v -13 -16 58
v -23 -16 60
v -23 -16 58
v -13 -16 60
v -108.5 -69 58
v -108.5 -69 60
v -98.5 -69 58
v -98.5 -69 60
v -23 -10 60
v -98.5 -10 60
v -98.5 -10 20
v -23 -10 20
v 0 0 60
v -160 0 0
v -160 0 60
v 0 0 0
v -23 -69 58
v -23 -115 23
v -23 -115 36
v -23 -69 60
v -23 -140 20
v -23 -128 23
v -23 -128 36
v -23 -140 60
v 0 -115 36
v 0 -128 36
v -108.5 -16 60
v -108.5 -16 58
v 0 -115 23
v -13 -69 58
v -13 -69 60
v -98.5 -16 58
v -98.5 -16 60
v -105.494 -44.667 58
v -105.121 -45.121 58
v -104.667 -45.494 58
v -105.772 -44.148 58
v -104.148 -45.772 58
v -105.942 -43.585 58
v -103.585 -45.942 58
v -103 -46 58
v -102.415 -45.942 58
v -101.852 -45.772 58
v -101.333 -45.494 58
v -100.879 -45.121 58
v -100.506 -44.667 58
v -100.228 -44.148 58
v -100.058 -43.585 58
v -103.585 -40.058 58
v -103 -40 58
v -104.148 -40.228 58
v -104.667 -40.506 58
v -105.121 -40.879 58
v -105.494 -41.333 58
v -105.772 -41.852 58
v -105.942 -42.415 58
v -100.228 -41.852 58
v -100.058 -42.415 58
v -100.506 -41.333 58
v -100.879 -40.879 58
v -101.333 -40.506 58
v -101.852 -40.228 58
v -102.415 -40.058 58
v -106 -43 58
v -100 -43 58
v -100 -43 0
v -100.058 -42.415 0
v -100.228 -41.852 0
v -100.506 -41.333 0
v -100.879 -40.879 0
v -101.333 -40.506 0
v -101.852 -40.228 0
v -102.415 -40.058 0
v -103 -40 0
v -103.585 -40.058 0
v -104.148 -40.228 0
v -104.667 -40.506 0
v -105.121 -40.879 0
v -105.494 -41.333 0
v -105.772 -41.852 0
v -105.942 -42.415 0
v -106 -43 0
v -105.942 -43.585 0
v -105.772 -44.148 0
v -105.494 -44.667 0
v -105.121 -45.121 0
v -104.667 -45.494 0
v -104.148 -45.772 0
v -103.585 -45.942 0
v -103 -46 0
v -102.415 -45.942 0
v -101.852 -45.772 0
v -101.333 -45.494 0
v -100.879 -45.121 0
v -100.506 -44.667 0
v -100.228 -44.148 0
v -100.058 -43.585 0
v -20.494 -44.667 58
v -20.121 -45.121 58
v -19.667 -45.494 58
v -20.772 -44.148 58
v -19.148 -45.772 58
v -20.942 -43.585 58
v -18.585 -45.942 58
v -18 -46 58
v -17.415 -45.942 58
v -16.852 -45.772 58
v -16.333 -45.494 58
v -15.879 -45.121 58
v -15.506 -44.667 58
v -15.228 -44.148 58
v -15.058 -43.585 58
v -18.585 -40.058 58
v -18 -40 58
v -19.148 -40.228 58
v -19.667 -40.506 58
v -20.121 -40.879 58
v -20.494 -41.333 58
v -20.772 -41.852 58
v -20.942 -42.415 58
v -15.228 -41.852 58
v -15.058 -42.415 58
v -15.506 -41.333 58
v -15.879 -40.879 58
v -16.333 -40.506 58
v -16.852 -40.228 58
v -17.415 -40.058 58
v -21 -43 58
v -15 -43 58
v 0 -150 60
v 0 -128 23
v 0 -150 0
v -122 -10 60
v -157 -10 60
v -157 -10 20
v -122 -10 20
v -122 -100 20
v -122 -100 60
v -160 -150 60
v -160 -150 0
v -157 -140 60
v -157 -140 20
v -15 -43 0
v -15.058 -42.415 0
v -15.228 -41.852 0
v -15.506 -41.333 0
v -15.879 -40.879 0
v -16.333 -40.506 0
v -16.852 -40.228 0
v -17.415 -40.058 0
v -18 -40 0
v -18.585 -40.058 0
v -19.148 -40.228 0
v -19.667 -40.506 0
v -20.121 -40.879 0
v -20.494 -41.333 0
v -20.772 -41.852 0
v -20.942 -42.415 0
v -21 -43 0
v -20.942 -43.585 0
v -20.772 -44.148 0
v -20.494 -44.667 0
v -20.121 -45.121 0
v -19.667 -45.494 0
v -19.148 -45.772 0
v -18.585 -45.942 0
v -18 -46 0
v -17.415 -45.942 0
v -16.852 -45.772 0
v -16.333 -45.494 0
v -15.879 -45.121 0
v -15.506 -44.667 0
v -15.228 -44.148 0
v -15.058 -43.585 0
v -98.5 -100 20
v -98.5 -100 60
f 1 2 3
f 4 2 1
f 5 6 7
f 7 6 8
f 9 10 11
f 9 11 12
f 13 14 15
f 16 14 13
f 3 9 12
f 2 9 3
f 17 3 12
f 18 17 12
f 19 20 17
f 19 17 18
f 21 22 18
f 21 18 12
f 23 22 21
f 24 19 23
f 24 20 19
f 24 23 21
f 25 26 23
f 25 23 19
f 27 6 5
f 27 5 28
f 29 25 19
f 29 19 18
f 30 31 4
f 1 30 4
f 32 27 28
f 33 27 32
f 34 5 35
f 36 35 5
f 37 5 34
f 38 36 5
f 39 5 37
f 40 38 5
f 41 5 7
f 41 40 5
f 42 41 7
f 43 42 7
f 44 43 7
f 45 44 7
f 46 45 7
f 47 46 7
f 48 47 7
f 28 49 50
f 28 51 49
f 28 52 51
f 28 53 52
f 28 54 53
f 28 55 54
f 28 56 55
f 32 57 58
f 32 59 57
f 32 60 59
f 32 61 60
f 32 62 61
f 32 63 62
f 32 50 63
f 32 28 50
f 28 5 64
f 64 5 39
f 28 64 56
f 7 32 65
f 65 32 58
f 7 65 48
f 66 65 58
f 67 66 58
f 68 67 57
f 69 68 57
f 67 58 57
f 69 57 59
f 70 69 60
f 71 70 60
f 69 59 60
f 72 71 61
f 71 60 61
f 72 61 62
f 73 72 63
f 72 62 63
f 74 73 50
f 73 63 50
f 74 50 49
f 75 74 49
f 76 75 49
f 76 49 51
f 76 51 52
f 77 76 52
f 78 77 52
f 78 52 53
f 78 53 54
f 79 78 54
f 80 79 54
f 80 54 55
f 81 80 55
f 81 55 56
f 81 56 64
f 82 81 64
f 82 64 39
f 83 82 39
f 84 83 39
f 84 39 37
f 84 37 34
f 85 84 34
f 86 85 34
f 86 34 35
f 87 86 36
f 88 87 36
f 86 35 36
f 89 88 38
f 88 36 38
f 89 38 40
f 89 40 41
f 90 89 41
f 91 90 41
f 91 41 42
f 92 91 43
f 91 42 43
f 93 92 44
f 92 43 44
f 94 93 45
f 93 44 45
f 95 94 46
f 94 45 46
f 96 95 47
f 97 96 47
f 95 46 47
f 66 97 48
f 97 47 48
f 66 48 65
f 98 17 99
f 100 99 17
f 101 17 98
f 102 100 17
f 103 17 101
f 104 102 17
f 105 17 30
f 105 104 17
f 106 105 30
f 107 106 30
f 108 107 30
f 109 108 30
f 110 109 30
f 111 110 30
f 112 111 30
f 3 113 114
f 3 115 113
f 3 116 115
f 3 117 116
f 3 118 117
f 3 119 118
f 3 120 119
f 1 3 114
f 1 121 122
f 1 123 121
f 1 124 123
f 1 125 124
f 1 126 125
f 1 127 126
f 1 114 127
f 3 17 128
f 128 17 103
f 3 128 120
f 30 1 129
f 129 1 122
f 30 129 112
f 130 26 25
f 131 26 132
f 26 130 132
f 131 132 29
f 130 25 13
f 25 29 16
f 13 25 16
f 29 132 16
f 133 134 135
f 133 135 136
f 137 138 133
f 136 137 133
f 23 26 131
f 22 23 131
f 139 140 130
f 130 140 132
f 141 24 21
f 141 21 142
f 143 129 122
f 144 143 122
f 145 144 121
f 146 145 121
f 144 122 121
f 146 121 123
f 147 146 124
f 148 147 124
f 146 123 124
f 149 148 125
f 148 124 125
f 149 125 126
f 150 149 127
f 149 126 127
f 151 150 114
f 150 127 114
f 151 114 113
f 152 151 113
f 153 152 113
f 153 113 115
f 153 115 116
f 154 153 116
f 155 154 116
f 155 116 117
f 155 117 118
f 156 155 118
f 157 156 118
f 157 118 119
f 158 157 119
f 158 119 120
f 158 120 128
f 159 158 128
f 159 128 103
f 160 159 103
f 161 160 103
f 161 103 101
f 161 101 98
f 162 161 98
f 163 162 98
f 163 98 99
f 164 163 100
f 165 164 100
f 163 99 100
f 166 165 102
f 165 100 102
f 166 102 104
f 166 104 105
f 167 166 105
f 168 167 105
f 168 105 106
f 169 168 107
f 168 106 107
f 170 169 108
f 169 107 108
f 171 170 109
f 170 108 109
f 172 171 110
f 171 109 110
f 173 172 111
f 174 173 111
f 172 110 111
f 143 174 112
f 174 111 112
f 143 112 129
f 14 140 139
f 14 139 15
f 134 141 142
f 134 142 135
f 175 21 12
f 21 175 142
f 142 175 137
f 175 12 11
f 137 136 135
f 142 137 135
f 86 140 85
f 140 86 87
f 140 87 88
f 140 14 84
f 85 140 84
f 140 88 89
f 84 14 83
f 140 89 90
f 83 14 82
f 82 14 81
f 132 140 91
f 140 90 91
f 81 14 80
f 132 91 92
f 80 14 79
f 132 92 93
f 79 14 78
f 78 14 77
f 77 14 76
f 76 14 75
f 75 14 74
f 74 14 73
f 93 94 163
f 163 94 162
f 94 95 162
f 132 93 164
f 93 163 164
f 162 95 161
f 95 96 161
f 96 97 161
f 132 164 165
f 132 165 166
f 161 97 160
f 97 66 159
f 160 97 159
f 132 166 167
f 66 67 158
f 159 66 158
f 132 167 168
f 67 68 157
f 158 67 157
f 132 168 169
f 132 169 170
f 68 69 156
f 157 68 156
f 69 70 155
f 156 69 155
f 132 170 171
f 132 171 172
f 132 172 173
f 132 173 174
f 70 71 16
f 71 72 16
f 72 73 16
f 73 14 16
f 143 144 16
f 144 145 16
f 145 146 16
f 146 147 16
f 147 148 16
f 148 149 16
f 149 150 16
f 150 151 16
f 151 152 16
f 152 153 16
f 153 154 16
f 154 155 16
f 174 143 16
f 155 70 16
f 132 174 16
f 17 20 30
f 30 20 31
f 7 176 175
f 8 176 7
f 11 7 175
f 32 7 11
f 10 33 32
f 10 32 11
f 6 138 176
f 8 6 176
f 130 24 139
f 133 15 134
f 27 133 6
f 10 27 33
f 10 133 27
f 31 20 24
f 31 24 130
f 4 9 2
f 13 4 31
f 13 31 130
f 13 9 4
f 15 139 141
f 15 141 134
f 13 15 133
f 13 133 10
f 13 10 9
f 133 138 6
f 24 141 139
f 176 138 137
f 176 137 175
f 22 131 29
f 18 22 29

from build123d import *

# Parameters (mm, degrees)
SKETCH2_W           = 160
SKETCH2_H           = 150
BOSS_EXTRUDE1_DEPTH = 60
CUT_EXTRUDE1_DEPTH  = 40
SKETCH4_R           = 3
CUT_EXTRUDE2_DEPTH  = 60
SKETCH5_W           = 13
SKETCH5_H           = 13
CUT_EXTRUDE3_DEPTH  = 50
SKETCH6_W           = 10
SKETCH6_H           = 53
CUT_EXTRUDE4_DEPTH  = 2
SKETCH7_W           = 35
SKETCH7_H           = 130
CUT_EXTRUDE5_DEPTH  = 40


with BuildPart() as part:
    # Sketch2 → Boss-Extrude1 (new body)
    with BuildSketch(Plane.XY):
        with Locations((-80, -75)):
            Rectangle(SKETCH2_W, SKETCH2_H)
    extrude(amount=BOSS_EXTRUDE1_DEPTH)

    # Sketch3 → Cut-Extrude1 (cut)
    with BuildSketch(Plane.XY.offset(60)):
        Polygon((-98.5, -10), (-23, -10), (-23, -140), (-157, -140), (-157, -100), (-98.5, -100), align=None)
    extrude(amount=-CUT_EXTRUDE1_DEPTH, mode=Mode.SUBTRACT)

    # Sketch4 → Cut-Extrude2 (cut)
    with BuildSketch(Plane.XY.offset(60)):
        with Locations((-103, -43)):
            Circle(SKETCH4_R)
        with Locations((-18, -43)):
            Circle(SKETCH4_R)
    extrude(amount=-CUT_EXTRUDE2_DEPTH, mode=Mode.SUBTRACT)

    # Sketch5 → Cut-Extrude3 (cut)
    with BuildSketch(Plane(origin=(0, 0, 0), x_dir=(0, 0, -1), z_dir=(1, 0, 0))):
        with Locations((-29.5, -121.5)):
            Rectangle(SKETCH5_W, SKETCH5_H)
    extrude(amount=-CUT_EXTRUDE3_DEPTH, mode=Mode.SUBTRACT)

    # Sketch6 → Cut-Extrude4 (cut)
    with BuildSketch(Plane.XY.offset(60)):
        with Locations((-103.5, -42.5)):
            Rectangle(SKETCH6_W, SKETCH6_H)
        with Locations((-18, -42.5)):
            Rectangle(SKETCH6_W, SKETCH6_H)
    extrude(amount=-CUT_EXTRUDE4_DEPTH, mode=Mode.SUBTRACT)

    # Sketch7 → Cut-Extrude5 (cut)
    with BuildSketch(Plane.XY.offset(60)):
        with Locations((-139.5, -75)):
            Rectangle(SKETCH7_W, SKETCH7_H)
    extrude(amount=-CUT_EXTRUDE5_DEPTH, mode=Mode.SUBTRACT)


solid = part.part
